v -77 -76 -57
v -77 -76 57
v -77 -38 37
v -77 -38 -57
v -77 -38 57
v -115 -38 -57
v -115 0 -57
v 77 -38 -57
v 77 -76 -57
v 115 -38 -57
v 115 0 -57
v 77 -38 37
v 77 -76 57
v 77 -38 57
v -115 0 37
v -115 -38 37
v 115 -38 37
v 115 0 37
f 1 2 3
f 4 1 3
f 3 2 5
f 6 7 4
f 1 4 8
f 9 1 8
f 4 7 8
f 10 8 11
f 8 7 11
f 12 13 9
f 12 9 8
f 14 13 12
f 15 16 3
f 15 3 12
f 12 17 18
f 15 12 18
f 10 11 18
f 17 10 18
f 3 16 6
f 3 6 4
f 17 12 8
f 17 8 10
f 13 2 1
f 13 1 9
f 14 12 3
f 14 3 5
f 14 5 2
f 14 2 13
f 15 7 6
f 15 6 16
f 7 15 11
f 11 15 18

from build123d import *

# Parameters (mm, degrees)
F0_W     = 230
F0_H     = 114
F1_DEPTH = 76
F3_W     = 38
F3_H     = 20
F4_DEPTH = 230.001
F6_W     = 38
F6_H     = 38
F7_DEPTH = 114.001


with BuildPart() as f1:
    # F0 (on Front) → F1 (new body)
    with BuildSketch(Plane.XZ):
        Rectangle(F0_W, F0_H)
    extrude(amount=F1_DEPTH)

    # F3 (on offset) → F4 (cut, through all)
    with BuildSketch(Plane.YZ.offset(115)):
        with Locations((-19, 47)):
            Rectangle(F3_W, F3_H)
    extrude(amount=-F4_DEPTH, mode=Mode.SUBTRACT)

    # F6 (on offset) → F7 (cut, through all)
    with BuildSketch(Plane.XY.offset(57)):
        with Locations((-96, -57)):
            Rectangle(F6_W, F6_H)
        with Locations((96, -57)):
            Rectangle(F6_W, F6_H)
    extrude(amount=-F7_DEPTH, mode=Mode.SUBTRACT)


solid = f1.part
